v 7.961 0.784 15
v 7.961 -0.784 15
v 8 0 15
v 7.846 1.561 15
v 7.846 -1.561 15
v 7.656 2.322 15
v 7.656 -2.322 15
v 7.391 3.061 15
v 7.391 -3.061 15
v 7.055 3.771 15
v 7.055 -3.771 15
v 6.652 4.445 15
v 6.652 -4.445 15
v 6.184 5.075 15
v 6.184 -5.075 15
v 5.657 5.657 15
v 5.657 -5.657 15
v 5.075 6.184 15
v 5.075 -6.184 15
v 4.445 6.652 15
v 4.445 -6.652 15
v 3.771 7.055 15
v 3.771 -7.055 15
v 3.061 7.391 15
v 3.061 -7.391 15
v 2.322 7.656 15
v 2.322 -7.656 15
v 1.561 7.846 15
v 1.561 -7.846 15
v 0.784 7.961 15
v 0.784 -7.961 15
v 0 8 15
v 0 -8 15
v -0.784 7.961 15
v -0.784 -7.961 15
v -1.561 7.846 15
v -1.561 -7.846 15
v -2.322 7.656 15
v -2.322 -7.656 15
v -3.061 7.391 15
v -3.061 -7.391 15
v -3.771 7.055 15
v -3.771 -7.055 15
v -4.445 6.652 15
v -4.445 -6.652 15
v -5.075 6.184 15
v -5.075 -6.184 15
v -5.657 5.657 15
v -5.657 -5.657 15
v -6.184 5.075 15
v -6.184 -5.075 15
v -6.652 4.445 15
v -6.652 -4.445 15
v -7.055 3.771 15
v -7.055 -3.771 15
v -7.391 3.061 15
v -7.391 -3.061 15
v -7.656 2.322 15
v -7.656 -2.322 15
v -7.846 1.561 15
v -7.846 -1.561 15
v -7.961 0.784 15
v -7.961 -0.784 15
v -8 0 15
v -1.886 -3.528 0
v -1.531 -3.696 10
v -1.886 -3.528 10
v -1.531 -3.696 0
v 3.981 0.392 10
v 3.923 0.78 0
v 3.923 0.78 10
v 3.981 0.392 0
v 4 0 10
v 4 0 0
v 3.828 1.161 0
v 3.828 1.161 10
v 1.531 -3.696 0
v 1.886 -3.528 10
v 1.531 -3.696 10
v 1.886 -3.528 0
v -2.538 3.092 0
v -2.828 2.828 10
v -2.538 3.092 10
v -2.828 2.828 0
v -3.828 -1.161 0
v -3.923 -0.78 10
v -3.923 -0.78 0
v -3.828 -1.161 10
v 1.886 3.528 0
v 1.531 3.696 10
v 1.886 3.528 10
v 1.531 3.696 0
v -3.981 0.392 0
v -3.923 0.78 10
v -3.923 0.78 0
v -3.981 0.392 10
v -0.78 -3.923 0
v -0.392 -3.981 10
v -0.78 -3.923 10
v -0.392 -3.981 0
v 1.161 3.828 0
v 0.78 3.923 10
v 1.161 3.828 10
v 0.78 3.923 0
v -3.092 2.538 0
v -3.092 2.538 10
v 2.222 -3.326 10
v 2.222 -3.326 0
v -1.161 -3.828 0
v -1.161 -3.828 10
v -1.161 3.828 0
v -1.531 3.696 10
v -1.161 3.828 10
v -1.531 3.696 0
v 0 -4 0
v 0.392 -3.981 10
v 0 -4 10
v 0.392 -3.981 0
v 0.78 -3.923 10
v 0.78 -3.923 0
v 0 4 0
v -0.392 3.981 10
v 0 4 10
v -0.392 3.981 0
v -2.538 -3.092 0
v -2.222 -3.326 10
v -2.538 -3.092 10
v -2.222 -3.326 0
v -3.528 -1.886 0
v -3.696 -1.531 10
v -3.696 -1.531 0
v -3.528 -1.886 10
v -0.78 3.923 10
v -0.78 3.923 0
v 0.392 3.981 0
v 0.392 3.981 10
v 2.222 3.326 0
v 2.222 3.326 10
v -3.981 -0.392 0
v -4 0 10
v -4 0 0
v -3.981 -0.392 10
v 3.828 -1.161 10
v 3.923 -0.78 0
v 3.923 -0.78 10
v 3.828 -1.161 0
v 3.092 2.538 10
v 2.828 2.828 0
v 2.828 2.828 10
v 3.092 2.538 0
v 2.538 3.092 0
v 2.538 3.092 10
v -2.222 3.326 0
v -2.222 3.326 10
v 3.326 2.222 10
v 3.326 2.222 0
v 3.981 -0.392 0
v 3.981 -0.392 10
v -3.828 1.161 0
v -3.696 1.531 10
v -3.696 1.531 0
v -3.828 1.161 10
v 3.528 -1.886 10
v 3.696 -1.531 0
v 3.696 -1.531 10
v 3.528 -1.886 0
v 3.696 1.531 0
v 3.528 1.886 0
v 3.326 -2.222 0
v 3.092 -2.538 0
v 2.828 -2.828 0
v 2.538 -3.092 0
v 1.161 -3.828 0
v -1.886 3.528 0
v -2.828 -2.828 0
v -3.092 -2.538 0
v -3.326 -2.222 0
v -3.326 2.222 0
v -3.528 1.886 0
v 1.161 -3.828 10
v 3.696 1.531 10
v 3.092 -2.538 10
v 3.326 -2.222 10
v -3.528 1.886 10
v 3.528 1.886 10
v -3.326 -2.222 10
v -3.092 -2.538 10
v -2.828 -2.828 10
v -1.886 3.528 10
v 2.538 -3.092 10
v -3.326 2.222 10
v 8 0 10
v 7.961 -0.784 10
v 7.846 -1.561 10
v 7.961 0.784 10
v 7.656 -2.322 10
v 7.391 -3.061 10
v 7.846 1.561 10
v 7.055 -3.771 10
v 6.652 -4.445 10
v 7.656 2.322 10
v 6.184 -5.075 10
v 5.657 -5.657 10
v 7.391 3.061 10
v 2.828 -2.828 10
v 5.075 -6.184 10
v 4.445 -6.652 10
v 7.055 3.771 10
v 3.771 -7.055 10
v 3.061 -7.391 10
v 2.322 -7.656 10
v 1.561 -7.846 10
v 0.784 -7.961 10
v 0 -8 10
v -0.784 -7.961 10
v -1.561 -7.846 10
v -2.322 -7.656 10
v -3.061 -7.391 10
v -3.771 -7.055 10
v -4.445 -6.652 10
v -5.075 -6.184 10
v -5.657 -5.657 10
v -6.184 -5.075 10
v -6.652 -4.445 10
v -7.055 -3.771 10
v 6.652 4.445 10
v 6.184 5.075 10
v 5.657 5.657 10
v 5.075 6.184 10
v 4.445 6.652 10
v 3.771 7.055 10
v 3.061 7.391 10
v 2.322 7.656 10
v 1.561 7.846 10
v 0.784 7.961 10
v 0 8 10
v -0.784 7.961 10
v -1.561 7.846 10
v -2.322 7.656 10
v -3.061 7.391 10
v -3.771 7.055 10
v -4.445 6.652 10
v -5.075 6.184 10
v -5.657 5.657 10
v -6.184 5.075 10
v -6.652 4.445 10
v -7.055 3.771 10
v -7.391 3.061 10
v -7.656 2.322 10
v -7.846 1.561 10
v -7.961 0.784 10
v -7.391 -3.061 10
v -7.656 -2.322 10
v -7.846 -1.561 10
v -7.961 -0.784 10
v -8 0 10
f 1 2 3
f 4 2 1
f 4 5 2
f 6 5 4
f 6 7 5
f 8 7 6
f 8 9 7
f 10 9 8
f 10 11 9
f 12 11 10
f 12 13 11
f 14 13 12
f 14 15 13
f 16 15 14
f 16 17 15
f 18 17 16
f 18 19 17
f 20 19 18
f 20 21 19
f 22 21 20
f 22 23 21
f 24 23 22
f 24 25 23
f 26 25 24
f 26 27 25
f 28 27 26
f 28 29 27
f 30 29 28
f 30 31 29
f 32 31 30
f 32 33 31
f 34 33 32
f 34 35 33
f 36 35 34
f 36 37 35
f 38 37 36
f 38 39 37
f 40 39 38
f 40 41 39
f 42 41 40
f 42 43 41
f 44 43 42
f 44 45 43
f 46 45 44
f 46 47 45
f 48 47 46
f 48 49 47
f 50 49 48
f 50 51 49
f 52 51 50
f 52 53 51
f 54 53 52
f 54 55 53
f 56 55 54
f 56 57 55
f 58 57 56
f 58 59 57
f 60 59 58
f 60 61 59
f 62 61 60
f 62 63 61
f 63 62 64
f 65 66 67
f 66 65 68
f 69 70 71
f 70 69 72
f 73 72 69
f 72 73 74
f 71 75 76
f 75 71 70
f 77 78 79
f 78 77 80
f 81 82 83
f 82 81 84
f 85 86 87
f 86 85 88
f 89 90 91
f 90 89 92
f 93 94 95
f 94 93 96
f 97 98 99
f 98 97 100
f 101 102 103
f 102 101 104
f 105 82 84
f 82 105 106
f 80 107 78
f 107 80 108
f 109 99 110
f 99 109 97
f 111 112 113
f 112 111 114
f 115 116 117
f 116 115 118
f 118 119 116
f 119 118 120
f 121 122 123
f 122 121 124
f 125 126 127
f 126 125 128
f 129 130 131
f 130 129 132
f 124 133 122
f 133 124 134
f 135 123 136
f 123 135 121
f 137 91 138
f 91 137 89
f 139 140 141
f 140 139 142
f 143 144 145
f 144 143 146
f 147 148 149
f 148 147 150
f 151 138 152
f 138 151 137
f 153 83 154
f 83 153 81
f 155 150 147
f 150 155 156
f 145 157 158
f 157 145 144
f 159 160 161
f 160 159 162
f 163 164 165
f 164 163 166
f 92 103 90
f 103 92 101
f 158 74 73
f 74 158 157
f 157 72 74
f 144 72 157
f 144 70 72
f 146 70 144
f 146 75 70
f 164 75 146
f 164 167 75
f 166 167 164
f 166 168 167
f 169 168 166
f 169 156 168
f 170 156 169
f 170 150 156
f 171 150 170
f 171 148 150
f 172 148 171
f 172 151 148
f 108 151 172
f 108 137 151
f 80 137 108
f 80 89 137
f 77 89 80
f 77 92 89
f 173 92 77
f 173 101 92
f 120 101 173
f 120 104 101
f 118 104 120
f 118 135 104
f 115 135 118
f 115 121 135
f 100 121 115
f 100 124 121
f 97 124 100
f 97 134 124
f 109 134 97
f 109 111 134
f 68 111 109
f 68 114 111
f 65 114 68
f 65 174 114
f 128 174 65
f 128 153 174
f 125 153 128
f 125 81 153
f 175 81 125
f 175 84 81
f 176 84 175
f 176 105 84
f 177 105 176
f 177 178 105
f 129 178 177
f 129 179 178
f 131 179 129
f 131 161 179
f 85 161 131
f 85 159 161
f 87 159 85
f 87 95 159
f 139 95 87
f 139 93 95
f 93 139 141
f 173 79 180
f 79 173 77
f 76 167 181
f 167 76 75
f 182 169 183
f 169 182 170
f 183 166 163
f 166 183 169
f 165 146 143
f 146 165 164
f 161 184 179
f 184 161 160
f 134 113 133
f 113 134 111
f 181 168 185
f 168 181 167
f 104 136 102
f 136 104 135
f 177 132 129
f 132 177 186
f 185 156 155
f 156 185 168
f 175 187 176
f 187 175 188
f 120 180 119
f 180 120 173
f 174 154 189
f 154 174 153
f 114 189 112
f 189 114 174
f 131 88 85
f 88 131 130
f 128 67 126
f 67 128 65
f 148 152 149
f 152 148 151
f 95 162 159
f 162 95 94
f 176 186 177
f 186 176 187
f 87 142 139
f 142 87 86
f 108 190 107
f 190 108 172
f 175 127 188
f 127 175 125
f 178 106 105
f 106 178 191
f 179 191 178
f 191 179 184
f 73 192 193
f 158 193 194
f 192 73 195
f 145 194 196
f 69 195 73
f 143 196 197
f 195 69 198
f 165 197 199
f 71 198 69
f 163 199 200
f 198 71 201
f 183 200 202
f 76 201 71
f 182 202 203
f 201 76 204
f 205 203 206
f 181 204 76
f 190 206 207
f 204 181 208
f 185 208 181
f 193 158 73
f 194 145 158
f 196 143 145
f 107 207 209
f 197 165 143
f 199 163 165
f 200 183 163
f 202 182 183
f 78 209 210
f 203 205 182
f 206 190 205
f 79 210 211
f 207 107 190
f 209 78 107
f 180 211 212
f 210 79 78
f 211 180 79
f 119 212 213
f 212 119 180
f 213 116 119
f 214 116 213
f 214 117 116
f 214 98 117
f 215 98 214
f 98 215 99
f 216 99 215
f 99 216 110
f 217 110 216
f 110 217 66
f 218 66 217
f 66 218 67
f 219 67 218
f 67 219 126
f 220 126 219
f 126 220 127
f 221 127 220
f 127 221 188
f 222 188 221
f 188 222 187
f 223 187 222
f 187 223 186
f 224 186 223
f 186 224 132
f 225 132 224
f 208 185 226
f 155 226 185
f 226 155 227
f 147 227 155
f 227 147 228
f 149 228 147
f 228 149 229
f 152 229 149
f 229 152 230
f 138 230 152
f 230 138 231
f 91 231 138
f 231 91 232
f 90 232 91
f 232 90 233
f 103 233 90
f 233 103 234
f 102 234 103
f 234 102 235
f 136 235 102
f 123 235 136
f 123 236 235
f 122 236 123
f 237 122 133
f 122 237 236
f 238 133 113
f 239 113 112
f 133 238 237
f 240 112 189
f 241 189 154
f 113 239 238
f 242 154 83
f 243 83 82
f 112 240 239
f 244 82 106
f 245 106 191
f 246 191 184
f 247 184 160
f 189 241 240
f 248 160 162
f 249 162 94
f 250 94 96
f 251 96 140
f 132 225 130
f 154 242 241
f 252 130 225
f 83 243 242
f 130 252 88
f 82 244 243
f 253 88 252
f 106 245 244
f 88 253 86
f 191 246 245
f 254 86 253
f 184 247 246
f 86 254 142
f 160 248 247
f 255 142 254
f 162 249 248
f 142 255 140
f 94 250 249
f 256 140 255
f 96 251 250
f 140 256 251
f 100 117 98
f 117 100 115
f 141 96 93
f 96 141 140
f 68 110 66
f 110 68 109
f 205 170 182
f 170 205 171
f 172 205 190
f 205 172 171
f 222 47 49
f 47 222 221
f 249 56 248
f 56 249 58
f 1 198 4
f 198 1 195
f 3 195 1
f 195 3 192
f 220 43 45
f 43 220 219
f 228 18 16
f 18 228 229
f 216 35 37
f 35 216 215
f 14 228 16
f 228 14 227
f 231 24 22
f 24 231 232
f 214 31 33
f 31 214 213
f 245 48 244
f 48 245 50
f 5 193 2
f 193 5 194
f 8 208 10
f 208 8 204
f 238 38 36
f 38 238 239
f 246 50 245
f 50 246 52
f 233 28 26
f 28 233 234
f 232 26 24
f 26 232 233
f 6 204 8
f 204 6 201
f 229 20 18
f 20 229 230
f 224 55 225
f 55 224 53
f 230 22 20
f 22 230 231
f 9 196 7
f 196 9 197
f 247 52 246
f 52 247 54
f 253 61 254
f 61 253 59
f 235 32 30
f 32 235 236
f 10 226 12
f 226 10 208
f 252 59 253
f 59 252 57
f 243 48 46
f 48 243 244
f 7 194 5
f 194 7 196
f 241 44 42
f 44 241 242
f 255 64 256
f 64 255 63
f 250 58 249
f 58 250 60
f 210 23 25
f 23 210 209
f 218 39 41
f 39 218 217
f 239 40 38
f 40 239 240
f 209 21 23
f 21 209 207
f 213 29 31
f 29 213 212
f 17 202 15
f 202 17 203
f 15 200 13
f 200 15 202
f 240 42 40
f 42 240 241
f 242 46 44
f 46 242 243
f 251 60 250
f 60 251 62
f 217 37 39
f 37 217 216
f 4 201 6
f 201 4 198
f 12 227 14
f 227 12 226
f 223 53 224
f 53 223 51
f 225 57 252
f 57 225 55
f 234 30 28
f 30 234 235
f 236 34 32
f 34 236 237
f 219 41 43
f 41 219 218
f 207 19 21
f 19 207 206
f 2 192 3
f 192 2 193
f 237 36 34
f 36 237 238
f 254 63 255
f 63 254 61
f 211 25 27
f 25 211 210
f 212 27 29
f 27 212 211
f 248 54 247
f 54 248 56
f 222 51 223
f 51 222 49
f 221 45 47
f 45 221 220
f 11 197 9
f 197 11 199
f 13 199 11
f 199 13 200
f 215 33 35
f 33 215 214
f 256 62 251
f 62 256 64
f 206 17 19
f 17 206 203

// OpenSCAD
module socket_head_cap_screw() {
    union() {
        // Screw shaft
        cylinder(h=10, d=8, $fn=64);
        
        // Screw head
        translate([0, 0, 10])
            cylinder(h=5, d=16, $fn=64);
        
        // Hex socket
        translate([0, 0, 10])
            difference() {
                cylinder(h=5, d=8, $fn=64);
                translate([0, 0, 0.5])
                    cylinder(h=4, d=6, $fn=6);
            }
    }
}

socket_head_cap_screw();
